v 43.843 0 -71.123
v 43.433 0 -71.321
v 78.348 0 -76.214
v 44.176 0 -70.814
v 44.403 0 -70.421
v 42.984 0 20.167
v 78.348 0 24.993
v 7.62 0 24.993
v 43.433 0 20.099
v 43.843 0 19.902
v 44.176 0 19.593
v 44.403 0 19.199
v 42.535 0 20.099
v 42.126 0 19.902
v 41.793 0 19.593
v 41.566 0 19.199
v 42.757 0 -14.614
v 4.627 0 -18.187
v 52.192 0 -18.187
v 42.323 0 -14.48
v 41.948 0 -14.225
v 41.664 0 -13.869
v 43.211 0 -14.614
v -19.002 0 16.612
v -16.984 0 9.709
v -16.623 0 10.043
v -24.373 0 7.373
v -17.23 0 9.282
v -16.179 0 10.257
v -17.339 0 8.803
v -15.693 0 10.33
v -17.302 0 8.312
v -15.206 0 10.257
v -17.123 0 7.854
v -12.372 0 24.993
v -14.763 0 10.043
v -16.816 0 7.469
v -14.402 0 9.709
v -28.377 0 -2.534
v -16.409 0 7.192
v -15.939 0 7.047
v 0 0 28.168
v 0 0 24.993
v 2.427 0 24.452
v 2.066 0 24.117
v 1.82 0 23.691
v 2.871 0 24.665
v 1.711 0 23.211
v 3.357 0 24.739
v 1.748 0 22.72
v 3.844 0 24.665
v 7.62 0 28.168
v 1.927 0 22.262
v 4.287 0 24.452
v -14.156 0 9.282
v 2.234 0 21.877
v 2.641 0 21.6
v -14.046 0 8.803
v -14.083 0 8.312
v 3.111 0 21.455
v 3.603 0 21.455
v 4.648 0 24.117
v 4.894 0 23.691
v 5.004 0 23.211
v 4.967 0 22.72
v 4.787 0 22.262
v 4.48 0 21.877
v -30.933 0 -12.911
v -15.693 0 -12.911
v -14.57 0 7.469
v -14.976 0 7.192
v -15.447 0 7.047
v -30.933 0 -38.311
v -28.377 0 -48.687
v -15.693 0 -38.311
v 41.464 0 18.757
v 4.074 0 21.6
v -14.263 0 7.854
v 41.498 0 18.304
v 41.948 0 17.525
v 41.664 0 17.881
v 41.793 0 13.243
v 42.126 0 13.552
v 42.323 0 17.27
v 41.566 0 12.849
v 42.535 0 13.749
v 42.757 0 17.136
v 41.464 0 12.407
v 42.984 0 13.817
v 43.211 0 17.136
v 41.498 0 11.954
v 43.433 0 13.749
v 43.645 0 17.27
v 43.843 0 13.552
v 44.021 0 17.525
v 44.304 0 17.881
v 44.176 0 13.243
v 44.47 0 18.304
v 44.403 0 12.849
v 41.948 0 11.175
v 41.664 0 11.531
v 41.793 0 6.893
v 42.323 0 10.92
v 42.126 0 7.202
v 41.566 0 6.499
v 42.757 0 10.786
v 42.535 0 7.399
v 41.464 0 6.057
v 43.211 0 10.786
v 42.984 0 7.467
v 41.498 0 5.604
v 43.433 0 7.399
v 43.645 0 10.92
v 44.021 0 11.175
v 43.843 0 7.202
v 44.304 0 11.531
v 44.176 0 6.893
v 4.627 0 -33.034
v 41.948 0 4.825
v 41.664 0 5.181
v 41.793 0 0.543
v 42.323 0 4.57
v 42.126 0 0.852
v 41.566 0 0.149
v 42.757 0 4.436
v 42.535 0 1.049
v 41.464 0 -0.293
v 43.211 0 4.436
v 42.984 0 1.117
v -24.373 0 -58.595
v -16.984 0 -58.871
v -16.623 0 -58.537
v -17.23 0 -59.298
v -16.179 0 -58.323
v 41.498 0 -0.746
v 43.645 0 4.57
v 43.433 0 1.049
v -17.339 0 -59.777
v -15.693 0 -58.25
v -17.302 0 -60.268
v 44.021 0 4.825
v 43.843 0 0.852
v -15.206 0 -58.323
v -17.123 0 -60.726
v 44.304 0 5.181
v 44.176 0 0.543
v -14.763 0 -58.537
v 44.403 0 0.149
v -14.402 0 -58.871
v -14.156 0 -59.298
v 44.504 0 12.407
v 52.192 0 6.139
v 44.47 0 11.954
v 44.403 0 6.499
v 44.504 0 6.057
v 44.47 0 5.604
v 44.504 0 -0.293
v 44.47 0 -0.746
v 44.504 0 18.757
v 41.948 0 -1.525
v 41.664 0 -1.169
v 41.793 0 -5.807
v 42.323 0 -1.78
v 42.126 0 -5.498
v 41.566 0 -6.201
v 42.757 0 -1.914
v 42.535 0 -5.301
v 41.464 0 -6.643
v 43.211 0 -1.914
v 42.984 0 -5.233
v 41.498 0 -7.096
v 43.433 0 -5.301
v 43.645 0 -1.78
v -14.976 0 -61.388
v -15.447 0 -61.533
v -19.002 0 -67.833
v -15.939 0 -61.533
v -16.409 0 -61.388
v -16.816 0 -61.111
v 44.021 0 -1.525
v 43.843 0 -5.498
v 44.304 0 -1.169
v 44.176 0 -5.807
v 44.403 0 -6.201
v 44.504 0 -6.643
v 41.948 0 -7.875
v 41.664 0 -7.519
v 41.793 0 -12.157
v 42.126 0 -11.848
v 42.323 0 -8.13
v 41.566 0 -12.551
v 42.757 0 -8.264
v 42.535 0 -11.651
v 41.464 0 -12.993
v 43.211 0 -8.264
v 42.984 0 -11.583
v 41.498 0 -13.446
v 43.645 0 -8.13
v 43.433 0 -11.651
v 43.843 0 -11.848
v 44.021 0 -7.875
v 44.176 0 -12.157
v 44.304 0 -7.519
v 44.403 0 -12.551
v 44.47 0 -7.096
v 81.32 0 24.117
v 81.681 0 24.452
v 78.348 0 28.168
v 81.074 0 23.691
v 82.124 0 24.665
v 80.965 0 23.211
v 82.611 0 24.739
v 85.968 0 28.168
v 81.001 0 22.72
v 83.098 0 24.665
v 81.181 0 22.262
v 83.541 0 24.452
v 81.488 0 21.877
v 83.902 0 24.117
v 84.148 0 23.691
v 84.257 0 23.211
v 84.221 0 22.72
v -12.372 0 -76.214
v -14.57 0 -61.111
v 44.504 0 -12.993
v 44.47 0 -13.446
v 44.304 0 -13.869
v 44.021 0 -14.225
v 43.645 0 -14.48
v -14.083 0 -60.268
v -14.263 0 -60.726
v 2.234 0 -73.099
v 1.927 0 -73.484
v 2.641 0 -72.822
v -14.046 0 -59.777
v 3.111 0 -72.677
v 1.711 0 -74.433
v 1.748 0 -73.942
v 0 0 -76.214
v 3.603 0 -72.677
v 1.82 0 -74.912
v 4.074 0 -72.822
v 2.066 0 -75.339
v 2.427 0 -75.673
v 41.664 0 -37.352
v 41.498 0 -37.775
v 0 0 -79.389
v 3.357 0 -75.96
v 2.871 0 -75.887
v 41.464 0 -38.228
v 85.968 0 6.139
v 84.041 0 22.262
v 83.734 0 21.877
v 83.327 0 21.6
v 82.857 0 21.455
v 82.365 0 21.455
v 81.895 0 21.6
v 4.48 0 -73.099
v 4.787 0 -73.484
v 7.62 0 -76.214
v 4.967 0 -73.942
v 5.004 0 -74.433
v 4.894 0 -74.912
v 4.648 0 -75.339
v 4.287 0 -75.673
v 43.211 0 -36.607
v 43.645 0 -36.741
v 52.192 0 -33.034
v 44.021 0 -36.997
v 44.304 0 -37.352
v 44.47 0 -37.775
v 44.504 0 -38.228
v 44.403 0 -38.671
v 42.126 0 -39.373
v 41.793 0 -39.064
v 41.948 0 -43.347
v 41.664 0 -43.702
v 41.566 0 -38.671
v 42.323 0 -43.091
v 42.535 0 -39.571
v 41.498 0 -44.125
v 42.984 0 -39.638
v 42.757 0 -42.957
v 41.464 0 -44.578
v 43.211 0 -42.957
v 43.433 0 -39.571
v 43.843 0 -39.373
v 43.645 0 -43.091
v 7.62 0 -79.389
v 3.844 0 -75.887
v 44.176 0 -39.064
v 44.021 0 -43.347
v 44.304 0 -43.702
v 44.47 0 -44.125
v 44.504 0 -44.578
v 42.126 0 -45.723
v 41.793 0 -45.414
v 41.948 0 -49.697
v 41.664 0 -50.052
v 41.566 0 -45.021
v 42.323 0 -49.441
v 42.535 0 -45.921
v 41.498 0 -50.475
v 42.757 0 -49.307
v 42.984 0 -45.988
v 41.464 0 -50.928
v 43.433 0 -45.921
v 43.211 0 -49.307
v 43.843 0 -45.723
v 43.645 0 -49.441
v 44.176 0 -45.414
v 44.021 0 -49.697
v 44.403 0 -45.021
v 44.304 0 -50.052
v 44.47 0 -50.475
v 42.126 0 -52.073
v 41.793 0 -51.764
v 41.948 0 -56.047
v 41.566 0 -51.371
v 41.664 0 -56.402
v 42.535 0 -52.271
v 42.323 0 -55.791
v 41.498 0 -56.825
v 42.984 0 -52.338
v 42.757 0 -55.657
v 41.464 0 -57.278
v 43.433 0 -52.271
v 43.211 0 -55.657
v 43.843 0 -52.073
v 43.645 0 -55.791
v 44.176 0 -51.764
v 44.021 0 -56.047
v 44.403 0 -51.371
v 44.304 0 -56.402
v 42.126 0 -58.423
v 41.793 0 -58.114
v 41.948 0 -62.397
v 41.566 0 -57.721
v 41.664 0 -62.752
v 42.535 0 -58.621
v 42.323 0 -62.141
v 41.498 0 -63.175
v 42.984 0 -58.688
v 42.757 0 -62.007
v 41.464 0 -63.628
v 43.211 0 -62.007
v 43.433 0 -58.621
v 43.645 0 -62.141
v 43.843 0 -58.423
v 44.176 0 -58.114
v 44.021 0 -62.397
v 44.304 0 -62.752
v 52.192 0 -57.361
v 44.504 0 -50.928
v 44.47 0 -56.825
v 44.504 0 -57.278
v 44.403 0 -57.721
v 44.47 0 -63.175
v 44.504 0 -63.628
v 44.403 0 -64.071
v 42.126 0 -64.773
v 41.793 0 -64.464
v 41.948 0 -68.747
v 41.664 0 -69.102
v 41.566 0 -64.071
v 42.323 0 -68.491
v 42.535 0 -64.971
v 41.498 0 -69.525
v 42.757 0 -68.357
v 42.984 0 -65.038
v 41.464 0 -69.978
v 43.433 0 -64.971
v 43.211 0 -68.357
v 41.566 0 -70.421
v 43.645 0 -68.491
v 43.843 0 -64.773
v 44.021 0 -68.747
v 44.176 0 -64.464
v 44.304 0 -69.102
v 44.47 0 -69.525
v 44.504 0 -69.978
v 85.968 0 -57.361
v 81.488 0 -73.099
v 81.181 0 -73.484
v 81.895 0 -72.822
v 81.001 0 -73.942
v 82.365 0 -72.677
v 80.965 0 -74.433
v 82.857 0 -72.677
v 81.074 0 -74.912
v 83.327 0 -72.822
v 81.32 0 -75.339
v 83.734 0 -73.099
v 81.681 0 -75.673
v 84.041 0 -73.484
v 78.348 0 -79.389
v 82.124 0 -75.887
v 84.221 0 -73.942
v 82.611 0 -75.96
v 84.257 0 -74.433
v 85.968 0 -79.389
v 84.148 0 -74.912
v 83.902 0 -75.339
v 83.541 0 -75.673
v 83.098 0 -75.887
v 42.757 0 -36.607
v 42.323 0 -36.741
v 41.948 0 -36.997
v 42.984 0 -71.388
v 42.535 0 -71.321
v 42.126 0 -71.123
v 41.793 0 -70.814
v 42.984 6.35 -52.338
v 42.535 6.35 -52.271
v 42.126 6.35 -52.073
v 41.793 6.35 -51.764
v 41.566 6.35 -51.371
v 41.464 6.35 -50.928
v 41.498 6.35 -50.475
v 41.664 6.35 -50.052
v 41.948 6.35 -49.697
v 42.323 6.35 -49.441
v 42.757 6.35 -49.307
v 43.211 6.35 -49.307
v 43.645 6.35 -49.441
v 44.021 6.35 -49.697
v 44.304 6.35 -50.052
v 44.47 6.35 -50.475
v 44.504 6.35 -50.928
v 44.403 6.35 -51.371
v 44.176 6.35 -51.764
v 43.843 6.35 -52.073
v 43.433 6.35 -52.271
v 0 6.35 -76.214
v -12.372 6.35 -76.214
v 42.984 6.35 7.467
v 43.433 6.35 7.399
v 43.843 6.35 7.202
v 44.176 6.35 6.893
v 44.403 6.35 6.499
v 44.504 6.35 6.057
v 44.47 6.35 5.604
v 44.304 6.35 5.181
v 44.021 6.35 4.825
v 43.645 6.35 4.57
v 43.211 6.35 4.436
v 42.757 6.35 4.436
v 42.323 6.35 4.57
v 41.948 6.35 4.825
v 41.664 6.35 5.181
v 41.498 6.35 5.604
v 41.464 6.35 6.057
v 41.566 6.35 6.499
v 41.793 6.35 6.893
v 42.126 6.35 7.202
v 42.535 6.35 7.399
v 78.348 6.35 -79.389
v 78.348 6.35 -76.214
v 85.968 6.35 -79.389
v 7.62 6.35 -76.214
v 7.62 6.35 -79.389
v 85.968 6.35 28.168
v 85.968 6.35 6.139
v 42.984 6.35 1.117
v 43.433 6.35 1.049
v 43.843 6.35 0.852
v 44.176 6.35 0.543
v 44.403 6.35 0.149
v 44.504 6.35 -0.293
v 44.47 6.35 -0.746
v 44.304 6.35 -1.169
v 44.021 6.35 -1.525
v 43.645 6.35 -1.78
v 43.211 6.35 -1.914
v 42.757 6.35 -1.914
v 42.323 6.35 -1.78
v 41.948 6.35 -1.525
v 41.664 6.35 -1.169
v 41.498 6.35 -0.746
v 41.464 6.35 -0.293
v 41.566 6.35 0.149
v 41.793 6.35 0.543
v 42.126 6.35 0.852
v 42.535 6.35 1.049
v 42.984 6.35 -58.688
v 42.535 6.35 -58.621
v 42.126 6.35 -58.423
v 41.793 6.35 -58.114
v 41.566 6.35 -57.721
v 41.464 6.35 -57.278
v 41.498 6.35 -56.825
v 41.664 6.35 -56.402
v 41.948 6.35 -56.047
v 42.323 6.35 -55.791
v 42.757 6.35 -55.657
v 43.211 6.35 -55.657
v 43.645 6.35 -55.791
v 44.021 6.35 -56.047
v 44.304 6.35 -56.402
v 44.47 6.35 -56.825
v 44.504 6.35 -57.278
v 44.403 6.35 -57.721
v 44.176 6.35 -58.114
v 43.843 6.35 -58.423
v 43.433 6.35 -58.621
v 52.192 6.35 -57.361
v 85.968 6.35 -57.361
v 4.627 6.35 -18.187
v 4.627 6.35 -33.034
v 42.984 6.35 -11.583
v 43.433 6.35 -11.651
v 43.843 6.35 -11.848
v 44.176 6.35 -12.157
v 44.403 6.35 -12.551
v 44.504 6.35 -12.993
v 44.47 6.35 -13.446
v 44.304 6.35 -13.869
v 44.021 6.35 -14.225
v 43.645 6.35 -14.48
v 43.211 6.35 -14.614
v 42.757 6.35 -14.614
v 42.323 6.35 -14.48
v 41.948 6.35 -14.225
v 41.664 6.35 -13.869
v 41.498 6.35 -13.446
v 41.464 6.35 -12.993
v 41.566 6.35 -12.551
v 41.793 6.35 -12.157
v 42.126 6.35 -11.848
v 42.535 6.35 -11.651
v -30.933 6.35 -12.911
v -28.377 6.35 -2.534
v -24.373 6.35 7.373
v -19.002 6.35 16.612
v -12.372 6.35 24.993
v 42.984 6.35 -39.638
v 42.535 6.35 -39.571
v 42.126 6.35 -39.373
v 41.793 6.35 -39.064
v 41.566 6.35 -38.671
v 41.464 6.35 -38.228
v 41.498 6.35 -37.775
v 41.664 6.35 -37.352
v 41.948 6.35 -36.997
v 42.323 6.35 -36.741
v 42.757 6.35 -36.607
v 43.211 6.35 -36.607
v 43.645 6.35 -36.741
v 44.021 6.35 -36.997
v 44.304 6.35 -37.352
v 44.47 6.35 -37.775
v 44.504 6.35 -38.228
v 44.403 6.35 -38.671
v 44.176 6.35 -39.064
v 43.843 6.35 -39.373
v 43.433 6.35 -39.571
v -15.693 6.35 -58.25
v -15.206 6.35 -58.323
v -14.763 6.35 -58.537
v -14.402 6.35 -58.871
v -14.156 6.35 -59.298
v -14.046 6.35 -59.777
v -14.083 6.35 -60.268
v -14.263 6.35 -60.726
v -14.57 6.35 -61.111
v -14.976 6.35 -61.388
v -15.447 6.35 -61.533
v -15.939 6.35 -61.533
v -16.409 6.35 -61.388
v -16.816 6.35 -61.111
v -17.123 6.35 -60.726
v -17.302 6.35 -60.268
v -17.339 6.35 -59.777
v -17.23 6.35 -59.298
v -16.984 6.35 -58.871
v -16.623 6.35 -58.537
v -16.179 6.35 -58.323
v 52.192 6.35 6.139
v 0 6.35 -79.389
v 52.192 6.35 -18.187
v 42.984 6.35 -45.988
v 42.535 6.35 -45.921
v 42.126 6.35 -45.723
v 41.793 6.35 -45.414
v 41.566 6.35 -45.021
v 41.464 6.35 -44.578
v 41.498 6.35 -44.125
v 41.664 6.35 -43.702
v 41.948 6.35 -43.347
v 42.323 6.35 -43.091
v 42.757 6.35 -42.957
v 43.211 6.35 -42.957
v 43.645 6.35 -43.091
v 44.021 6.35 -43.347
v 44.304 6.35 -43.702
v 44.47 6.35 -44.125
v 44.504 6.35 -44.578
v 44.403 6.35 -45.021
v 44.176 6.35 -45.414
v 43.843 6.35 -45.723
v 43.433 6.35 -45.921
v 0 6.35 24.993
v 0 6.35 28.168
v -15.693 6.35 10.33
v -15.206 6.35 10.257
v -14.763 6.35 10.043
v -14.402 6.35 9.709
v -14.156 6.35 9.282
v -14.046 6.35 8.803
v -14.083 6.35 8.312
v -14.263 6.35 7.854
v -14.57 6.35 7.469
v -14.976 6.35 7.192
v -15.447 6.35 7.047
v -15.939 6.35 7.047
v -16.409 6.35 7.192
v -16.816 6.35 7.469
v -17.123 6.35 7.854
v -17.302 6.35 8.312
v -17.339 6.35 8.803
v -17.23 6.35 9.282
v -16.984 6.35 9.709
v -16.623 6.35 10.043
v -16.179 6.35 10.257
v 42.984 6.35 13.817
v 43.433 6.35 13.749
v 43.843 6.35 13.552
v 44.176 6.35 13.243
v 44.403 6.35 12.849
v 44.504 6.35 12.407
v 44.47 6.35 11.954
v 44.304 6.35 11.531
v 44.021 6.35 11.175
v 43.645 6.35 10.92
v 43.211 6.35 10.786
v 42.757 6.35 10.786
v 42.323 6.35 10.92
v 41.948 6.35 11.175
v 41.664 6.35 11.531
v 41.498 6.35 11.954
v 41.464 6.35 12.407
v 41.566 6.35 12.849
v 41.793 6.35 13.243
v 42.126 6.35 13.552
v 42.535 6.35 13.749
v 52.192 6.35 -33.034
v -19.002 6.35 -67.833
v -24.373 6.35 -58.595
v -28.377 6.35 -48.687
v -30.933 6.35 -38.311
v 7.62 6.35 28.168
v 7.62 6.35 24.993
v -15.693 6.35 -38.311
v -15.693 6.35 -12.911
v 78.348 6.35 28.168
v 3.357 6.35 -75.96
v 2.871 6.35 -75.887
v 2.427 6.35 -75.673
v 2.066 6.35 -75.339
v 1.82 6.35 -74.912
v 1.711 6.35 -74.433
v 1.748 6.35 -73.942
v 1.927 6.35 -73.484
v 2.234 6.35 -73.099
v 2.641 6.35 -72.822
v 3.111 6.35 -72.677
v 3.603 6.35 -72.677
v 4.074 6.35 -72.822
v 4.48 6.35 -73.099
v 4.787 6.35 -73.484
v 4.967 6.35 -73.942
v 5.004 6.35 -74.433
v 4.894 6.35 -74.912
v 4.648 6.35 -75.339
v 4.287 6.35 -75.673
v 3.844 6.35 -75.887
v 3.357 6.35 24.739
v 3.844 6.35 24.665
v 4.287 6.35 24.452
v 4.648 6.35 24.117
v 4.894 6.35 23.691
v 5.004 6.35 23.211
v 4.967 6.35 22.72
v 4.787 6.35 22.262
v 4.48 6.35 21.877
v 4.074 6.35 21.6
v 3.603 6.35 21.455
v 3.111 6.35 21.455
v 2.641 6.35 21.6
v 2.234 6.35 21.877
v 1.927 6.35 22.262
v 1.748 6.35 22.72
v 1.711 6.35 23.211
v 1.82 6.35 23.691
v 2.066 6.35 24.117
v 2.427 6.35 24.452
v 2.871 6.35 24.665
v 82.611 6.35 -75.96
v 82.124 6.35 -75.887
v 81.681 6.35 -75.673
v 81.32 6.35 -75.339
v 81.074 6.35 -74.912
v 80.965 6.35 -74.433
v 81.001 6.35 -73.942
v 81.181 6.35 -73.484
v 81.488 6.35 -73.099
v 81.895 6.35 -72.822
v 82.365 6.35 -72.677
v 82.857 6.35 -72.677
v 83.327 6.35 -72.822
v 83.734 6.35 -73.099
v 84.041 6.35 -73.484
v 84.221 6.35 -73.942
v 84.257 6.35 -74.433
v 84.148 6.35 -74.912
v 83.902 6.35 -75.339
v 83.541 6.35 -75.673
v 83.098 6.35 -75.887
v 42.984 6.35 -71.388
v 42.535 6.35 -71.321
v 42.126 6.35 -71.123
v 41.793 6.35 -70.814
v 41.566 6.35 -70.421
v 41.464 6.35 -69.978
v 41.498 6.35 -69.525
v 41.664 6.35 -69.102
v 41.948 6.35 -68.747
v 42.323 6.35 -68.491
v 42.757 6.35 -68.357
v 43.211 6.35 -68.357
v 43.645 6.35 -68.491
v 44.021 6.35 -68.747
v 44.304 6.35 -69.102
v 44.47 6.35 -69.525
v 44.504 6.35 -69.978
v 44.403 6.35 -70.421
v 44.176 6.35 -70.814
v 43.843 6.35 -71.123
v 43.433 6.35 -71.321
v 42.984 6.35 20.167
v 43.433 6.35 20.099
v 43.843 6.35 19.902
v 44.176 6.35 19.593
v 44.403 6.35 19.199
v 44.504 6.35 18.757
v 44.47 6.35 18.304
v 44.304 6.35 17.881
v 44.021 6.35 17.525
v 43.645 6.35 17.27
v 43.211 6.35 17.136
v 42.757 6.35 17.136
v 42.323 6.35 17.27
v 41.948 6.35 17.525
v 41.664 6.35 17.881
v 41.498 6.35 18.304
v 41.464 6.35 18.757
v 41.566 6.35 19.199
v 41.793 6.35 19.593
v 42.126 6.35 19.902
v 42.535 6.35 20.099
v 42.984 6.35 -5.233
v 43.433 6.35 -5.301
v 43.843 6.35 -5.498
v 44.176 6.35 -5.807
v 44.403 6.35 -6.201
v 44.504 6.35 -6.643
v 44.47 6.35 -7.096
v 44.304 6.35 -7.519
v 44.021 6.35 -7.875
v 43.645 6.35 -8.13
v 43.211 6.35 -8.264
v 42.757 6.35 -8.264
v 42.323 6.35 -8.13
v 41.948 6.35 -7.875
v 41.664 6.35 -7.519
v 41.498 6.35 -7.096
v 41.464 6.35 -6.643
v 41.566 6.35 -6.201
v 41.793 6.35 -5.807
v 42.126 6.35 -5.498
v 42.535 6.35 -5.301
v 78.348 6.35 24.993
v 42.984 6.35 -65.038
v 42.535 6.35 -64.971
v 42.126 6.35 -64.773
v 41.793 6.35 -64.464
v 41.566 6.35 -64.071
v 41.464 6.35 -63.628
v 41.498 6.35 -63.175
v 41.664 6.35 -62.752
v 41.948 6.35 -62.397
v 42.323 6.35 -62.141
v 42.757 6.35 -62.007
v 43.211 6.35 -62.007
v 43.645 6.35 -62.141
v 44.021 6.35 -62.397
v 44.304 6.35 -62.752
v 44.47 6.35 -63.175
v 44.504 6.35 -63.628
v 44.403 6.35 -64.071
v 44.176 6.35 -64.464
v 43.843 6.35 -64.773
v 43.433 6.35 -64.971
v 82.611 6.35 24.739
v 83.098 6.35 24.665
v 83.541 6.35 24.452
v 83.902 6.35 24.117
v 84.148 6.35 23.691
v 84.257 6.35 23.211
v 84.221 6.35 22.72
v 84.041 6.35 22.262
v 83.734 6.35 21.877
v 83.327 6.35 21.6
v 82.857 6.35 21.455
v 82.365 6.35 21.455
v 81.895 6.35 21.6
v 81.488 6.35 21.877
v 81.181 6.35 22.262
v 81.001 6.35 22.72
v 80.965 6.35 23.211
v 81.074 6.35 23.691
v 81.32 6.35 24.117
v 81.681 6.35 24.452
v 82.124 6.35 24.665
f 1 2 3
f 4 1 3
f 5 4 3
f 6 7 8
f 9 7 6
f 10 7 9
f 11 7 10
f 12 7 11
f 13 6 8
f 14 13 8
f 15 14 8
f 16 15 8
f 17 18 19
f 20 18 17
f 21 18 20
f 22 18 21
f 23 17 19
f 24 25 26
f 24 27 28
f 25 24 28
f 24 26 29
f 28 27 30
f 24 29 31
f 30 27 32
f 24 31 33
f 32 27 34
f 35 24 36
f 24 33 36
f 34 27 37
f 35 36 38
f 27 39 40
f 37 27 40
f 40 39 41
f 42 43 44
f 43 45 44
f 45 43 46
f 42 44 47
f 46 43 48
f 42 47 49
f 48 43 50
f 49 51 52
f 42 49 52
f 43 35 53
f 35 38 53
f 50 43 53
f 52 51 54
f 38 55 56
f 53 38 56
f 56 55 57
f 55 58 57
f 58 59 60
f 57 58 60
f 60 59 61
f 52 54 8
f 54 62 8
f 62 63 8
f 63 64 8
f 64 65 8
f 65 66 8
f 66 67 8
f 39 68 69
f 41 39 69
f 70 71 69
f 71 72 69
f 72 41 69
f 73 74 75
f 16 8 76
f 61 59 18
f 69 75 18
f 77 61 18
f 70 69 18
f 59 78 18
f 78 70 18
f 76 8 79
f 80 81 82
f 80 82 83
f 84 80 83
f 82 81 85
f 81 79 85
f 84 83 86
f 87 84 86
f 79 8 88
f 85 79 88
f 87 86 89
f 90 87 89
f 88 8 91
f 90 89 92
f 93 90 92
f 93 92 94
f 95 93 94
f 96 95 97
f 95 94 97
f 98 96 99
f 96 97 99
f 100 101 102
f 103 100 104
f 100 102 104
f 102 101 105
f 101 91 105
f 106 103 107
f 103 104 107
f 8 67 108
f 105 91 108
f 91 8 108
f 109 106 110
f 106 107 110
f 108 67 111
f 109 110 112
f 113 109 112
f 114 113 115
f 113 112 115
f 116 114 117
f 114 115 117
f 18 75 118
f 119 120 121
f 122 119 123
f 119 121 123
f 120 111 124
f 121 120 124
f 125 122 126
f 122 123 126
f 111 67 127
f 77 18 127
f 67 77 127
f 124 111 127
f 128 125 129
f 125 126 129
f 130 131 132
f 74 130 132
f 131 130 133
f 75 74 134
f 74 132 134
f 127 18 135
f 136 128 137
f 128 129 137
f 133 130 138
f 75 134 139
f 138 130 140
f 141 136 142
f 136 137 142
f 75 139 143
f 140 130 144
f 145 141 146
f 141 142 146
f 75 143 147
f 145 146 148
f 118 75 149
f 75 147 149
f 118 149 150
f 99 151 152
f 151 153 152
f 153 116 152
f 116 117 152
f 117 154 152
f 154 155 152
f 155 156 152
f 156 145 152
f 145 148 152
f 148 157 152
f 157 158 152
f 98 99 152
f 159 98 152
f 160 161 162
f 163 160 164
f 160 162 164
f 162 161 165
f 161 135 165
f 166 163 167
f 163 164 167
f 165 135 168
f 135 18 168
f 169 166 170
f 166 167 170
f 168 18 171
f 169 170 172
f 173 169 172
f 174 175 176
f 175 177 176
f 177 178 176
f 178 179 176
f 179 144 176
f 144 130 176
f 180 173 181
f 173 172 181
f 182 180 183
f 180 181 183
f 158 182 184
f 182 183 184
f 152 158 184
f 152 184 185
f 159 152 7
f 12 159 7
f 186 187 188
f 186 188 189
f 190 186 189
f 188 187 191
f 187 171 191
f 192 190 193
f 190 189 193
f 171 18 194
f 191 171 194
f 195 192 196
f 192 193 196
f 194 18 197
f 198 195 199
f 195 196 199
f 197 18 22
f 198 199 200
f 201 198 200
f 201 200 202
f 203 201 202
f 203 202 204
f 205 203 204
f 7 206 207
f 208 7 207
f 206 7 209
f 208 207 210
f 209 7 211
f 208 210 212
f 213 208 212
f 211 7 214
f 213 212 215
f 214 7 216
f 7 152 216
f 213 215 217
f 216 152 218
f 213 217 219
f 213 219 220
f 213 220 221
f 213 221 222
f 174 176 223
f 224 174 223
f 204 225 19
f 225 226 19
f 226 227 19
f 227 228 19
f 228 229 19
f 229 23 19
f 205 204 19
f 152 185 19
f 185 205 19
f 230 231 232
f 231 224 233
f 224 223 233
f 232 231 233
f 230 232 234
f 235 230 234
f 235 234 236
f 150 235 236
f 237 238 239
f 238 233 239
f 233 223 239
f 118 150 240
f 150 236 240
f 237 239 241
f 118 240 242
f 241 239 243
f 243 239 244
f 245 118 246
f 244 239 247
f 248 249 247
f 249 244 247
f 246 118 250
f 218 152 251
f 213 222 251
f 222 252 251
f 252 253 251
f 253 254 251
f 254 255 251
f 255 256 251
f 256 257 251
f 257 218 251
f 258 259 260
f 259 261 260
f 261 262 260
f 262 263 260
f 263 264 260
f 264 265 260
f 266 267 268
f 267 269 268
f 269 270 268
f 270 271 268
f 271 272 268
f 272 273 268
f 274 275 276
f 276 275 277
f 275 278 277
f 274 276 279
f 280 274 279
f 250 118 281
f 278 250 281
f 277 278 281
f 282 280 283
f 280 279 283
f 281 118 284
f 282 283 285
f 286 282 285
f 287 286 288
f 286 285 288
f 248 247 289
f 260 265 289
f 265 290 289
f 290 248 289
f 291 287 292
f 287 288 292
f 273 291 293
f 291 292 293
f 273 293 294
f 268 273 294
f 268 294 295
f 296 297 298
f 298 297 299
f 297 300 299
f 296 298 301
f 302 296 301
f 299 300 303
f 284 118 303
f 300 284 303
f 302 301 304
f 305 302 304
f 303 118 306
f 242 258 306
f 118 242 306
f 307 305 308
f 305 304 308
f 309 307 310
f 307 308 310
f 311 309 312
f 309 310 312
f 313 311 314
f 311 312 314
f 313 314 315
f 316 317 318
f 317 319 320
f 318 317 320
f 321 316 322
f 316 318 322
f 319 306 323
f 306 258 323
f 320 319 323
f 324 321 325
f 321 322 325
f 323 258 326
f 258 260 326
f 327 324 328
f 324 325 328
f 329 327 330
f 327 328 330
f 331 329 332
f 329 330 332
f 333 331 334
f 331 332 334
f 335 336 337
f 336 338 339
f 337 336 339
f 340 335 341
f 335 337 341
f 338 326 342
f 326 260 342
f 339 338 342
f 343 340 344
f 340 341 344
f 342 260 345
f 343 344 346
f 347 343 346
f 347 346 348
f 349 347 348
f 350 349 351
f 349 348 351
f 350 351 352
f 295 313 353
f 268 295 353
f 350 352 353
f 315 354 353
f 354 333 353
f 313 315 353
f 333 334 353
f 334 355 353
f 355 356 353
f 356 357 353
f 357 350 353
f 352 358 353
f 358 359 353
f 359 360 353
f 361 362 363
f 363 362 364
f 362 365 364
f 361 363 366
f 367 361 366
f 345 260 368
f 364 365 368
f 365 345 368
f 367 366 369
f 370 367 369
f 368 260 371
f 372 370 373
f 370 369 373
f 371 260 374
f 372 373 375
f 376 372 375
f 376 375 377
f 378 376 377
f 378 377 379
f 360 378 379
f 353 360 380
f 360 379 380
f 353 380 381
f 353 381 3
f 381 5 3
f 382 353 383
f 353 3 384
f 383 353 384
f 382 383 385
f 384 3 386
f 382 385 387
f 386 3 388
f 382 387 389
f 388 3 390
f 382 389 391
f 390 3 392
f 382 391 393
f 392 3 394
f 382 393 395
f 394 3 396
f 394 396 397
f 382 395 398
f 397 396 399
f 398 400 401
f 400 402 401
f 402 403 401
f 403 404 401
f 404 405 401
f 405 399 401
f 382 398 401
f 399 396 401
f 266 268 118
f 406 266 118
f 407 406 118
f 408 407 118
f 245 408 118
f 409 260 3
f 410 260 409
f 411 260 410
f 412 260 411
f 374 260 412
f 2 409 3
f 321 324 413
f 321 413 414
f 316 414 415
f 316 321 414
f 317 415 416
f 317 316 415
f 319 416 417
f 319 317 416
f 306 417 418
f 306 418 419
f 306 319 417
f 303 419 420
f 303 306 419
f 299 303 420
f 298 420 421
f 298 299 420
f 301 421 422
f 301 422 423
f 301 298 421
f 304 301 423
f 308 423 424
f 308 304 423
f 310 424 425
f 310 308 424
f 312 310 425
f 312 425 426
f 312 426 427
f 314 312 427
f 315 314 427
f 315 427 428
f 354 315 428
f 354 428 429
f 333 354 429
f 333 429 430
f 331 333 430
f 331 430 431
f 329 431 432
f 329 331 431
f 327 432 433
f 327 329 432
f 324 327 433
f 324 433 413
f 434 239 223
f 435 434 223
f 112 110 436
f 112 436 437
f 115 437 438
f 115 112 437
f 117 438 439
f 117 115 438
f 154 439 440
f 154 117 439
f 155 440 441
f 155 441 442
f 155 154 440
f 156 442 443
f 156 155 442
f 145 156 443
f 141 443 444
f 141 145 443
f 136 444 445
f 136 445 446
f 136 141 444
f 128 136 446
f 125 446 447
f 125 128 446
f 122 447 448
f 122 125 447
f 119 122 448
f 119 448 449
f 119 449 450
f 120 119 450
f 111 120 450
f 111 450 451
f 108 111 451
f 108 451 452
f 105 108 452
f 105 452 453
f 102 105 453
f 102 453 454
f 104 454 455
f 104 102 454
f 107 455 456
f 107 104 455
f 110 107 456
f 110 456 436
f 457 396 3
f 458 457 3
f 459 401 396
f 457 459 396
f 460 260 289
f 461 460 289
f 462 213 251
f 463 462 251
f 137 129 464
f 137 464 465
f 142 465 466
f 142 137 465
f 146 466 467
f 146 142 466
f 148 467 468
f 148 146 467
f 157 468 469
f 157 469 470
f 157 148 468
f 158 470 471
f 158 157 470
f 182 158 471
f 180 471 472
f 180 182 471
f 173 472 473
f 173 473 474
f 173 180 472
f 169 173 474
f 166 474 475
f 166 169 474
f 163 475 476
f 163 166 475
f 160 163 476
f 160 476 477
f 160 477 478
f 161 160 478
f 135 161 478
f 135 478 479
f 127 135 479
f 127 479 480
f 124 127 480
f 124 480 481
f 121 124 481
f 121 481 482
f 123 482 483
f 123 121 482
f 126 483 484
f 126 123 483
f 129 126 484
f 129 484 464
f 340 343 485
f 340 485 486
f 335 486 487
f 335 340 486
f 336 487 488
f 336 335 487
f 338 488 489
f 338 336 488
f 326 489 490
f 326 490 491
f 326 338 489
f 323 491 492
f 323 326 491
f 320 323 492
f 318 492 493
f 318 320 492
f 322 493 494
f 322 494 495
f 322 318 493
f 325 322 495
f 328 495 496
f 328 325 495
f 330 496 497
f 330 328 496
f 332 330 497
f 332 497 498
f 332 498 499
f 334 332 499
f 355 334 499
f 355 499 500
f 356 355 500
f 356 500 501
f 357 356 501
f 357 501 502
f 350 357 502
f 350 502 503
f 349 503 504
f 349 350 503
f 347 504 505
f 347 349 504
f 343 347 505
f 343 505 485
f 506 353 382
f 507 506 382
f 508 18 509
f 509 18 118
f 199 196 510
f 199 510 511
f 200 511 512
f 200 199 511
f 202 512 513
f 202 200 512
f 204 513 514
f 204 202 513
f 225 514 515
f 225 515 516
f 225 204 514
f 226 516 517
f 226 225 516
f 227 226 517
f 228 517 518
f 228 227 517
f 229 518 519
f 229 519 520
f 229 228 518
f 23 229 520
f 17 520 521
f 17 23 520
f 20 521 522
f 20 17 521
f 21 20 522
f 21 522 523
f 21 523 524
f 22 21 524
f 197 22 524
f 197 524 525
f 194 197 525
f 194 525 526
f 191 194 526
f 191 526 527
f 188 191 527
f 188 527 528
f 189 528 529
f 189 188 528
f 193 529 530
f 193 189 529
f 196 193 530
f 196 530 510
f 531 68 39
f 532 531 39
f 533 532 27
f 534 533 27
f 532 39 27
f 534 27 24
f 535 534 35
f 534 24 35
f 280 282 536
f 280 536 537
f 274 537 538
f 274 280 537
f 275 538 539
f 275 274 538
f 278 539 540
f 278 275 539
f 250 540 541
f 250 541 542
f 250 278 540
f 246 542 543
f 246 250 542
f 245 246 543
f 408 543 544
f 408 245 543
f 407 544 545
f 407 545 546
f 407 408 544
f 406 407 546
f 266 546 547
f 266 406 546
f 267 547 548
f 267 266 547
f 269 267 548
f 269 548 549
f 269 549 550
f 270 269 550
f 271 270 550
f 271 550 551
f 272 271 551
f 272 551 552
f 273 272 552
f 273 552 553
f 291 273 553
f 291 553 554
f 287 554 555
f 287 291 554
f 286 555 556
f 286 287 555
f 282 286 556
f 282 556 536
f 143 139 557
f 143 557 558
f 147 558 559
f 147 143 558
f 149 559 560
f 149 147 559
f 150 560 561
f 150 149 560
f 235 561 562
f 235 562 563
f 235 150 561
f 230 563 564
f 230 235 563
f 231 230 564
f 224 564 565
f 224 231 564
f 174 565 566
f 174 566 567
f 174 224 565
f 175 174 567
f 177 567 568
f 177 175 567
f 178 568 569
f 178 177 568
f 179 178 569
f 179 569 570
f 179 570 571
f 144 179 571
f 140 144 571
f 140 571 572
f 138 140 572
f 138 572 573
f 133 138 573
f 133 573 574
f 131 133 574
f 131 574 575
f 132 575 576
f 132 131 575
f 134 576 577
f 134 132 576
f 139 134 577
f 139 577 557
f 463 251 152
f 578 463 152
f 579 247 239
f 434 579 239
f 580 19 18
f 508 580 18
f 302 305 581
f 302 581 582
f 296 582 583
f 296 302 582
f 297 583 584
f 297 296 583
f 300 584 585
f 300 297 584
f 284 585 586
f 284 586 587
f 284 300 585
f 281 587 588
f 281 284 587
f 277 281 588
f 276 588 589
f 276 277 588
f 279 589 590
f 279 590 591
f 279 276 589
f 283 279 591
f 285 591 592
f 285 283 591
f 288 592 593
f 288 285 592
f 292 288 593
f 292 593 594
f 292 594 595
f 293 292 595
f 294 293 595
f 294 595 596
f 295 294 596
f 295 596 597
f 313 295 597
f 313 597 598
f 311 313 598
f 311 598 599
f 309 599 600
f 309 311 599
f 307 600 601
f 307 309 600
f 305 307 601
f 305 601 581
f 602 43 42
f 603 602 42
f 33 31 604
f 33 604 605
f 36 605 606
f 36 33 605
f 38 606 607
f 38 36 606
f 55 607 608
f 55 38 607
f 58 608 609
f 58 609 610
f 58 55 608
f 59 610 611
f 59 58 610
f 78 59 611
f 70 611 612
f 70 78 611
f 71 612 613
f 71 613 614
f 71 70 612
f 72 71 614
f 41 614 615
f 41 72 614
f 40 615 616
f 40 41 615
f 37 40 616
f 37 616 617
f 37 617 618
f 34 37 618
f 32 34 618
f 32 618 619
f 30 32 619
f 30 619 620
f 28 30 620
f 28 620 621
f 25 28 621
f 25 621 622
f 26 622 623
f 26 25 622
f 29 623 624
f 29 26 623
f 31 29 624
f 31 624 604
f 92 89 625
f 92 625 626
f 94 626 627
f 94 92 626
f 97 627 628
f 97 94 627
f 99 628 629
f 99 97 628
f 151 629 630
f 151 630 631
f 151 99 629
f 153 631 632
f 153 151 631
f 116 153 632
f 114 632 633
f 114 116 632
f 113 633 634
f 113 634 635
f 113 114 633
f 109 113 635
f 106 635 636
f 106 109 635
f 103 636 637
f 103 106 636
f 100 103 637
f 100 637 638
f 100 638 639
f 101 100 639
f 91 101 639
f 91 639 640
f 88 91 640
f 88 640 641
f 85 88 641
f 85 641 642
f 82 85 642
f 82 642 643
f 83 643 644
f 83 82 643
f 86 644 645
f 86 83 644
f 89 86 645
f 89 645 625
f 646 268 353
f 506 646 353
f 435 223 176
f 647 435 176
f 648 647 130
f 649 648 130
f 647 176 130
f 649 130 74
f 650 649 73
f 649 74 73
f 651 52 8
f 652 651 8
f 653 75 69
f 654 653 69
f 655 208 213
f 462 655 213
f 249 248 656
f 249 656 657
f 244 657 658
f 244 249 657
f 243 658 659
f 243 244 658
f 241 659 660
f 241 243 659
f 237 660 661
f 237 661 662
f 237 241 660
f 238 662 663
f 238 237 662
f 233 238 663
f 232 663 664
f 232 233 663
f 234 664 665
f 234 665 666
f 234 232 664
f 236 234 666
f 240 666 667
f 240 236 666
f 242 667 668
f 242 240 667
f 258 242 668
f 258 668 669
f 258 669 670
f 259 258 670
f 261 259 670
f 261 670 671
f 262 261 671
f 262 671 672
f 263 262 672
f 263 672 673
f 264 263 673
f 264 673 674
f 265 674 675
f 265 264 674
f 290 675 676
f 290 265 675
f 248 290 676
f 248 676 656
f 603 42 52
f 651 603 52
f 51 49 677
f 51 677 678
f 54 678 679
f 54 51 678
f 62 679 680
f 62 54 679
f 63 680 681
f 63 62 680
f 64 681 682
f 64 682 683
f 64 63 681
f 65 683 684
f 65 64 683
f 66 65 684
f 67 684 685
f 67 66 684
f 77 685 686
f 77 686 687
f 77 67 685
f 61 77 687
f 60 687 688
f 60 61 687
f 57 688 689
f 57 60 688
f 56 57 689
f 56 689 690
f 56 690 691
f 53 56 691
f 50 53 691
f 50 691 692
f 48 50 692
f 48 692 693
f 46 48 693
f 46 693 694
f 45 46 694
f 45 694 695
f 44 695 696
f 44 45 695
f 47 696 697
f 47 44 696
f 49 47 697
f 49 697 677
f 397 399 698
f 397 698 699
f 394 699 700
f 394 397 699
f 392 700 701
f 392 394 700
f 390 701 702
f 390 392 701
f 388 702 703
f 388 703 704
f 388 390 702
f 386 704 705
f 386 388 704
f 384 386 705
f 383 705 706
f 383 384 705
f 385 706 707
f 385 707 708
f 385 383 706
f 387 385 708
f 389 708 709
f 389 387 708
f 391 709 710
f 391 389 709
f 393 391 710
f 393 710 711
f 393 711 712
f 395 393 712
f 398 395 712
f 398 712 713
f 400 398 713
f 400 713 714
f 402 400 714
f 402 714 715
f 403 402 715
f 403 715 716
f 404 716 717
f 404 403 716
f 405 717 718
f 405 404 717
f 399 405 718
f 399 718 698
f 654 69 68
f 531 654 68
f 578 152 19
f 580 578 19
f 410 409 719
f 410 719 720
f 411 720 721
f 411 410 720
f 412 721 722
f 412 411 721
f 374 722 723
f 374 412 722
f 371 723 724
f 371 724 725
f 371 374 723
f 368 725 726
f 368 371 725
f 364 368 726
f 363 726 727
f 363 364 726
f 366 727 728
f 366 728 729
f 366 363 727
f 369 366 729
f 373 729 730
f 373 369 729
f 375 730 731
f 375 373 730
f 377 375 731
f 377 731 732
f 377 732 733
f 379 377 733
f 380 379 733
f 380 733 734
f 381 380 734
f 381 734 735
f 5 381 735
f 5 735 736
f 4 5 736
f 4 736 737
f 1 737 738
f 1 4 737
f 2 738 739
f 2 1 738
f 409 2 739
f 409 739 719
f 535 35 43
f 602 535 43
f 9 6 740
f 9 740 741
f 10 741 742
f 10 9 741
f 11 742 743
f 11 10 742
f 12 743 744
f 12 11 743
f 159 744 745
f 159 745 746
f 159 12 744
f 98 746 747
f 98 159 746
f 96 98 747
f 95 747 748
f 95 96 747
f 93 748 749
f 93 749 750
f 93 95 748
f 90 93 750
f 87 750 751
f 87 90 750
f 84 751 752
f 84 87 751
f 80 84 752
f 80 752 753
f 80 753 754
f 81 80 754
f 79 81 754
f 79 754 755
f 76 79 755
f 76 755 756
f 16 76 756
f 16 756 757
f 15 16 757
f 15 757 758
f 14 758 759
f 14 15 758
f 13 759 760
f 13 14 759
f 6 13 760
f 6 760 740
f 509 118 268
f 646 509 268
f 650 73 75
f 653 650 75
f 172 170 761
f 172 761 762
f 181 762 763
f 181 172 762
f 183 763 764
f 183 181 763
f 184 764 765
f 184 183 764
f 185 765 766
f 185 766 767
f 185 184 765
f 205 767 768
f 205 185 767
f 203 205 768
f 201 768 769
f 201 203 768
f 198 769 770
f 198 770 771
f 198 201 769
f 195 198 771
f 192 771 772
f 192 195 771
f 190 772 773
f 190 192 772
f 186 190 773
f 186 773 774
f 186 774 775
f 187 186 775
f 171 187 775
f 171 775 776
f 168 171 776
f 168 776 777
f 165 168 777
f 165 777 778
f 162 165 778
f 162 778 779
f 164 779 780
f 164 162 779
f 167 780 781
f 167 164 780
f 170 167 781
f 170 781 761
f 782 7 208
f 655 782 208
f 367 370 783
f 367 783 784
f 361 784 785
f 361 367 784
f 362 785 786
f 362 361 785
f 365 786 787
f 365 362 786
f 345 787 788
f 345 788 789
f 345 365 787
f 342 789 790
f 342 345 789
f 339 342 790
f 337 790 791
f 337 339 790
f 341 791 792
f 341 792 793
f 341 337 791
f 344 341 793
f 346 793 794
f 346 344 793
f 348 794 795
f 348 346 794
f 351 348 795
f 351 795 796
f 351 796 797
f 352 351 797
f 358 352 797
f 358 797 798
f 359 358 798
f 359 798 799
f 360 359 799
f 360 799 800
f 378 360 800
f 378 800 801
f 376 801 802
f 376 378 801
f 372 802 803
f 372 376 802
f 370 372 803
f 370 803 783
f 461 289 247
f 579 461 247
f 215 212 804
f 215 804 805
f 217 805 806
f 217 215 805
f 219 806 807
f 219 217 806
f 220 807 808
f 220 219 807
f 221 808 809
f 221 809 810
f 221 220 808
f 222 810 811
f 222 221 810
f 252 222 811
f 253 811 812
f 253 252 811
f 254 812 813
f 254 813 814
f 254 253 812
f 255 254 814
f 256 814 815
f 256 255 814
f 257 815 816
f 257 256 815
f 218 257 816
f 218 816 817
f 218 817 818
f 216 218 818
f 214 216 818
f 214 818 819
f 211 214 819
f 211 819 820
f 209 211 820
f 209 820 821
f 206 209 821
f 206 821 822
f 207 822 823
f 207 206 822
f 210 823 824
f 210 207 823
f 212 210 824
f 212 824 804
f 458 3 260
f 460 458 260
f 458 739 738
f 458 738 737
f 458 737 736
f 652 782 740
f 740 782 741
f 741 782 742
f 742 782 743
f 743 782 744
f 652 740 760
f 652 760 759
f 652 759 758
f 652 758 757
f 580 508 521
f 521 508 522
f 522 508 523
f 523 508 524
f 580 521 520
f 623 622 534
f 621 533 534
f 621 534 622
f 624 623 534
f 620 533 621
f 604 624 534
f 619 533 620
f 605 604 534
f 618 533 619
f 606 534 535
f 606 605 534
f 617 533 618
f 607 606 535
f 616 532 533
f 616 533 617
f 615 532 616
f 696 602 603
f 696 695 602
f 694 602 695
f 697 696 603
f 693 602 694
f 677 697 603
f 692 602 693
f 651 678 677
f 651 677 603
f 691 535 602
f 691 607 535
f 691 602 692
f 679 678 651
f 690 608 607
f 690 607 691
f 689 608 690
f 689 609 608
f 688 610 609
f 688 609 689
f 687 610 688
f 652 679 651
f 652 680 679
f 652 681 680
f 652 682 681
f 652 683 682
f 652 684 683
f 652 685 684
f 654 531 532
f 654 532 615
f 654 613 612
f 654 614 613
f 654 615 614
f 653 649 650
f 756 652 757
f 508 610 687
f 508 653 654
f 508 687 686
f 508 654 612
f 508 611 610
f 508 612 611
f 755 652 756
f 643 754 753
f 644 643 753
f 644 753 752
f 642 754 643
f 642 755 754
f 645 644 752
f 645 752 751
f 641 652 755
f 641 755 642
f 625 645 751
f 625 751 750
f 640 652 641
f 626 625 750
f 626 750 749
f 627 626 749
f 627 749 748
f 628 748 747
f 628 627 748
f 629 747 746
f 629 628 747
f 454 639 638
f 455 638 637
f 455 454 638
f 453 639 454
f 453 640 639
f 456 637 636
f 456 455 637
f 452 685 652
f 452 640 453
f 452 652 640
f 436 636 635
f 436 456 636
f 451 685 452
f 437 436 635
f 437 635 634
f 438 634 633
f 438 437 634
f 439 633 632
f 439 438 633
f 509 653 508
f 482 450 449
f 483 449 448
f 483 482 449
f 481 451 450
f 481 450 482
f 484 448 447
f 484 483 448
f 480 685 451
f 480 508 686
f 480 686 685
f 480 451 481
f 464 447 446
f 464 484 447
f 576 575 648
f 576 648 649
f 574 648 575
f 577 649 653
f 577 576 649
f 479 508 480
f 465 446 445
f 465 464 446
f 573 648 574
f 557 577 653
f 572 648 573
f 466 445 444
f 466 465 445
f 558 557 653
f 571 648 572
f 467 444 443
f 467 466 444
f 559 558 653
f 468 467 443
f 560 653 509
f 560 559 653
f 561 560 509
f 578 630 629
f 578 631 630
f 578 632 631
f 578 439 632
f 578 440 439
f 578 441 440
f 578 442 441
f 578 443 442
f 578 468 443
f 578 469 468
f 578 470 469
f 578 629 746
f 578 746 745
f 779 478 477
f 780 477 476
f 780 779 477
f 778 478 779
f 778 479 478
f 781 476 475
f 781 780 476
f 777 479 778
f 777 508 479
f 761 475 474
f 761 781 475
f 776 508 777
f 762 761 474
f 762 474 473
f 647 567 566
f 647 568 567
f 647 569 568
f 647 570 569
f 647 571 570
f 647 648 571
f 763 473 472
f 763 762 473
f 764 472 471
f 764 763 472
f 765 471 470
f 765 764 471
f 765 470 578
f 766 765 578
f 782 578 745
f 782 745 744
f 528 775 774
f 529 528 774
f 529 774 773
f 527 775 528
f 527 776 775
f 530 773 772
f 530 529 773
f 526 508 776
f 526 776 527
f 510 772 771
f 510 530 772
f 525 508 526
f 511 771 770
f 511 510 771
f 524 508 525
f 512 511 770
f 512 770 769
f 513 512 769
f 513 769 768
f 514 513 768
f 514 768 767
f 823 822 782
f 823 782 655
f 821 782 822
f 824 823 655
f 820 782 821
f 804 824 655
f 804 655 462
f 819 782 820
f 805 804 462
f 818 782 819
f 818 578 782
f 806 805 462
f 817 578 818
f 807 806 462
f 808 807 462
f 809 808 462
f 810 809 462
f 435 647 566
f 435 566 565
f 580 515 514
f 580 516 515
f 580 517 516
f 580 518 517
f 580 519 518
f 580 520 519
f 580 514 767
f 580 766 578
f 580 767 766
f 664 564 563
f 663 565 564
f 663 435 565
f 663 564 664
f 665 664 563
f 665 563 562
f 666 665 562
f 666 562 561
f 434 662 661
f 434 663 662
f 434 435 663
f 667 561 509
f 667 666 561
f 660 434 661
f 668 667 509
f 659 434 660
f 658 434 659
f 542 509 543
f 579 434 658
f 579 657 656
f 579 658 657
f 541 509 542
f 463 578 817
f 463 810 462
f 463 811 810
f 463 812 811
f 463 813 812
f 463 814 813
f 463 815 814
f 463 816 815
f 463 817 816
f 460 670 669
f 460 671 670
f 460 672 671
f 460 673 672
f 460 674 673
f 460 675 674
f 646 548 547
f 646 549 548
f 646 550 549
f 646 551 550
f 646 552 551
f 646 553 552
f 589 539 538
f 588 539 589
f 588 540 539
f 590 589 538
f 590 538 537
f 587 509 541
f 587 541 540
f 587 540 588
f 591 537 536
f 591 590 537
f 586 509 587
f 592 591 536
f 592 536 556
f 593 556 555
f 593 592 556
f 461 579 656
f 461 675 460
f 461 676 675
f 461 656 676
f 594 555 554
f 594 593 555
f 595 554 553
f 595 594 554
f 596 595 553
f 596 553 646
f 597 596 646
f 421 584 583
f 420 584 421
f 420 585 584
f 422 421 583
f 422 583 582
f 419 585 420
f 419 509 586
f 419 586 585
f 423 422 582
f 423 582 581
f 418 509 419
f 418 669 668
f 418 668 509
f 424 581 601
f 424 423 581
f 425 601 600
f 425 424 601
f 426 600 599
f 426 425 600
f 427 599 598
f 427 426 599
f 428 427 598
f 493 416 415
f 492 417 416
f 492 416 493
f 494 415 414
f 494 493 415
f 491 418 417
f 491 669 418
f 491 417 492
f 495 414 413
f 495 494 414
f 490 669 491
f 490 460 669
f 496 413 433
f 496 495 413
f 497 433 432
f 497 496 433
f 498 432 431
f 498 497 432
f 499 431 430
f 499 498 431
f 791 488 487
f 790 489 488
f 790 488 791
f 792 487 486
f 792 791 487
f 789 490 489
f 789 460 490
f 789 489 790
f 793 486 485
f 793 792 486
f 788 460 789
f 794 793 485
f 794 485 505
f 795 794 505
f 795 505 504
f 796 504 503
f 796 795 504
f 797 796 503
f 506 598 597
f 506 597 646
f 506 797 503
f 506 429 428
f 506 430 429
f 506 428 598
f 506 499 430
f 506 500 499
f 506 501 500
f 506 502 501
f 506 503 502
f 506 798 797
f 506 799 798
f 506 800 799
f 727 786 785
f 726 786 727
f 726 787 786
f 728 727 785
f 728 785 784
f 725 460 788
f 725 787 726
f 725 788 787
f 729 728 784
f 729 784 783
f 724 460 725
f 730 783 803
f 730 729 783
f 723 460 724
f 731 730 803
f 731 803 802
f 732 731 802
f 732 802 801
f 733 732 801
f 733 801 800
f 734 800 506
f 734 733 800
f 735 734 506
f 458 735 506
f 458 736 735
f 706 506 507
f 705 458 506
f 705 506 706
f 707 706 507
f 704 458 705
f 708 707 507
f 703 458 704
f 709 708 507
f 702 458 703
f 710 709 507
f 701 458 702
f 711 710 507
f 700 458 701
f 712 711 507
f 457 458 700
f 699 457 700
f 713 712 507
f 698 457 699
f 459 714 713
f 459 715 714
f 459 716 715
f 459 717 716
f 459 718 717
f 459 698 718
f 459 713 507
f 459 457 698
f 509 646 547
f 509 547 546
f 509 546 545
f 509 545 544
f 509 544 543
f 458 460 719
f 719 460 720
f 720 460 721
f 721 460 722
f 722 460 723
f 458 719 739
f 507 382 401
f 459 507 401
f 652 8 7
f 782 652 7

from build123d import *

# Parameters (mm, degrees)
SKETCH1_R           = 1.651
SKETCH1_R_2         = 1.524
BOSS_EXTRUDE1_DEPTH = 6.35


with BuildPart() as part:
    # Sketch1 → Boss-Extrude1 (new body)
    with BuildSketch(Plane(origin=(0, 0, 0), x_dir=(1, 0, 0), z_dir=(0, 1, 0))):
        with BuildLine():
            Line((33.776652136, 18.187342636), (4.627239322, 18.187342636))
            Line((4.627239322, 18.187342636), (4.627239322, 33.034266248))
            Line((4.627239322, 33.034266248), (33.776652136, 33.034266248))
            Line((33.776652136, 33.034266248), (52.191652136, 33.034266248))
            Line((52.191652136, 33.034266248), (52.191652136, 57.360804442))
            Line((52.191652136, 57.360804442), (85.968304273, 57.360804442))
            Line((85.968304273, 57.360804442), (85.968304273, 76.214266248))
            Line((85.968304273, 76.214266248), (85.968304273, 79.389266248))
            Line((85.968304273, 79.389266248), (78.348304273, 79.389266248))
            Line((78.348304273, 79.389266248), (78.348304273, 76.214266248))
            Line((78.348304273, 76.214266248), (7.62, 76.214266248))
            Line((7.62, 76.214266248), (7.62, 79.389266248))
            Line((7.62, 79.389266248), (0, 79.389266248))
            Line((0, 79.389266248), (0, 76.214266248))
            Line((0, 76.214266248), (-12.371874213, 76.214266248))
            ThreePointArc((-12.371874213, 76.214266248), (-24.373410945, 58.595023332), (-30.932760678, 38.310804442))
            Line((-30.932760678, 38.310804442), (-15.692760678, 38.310804442))
            Line((-15.692760678, 38.310804442), (-15.692760678, 12.910804442))
            Line((-15.692760678, 12.910804442), (-30.932760678, 12.910804442))
            ThreePointArc((-30.932760678, 12.910804442), (-24.373410945, -7.373414447), (-12.371874213, -24.992657364))
            Line((-12.371874213, -24.992657364), (0, -24.992657364))
            Line((0, -24.992657364), (0, -28.167657364))
            Line((0, -28.167657364), (7.62, -28.167657364))
            Line((7.62, -28.167657364), (7.62, -24.992657364))
            Line((7.62, -24.992657364), (78.348304273, -24.992657364))
            Line((78.348304273, -24.992657364), (78.348304273, -28.167657364))
            Line((78.348304273, -28.167657364), (85.968304273, -28.167657364))
            Line((85.968304273, -28.167657364), (85.968304273, -24.992657364))
            Line((85.968304273, -24.992657364), (85.968304273, -6.139195558))
            Line((85.968304273, -6.139195558), (52.191652136, -6.139195558))
            Line((52.191652136, -6.139195558), (52.191652136, 18.187342636))
            Line((52.191652136, 18.187342636), (33.776652136, 18.187342636))
        make_face()
        with Locations(Location((3.357239322, -23.087657364, 0), (0, 0, 270))):
            Circle(SKETCH1_R, mode=Mode.SUBTRACT)
        with Locations(Location((82.611064951, -23.087657364, 0), (0, 0, 270))):
            Circle(SKETCH1_R, mode=Mode.SUBTRACT)
        with Locations(Location((42.984152136, -12.292657364, 0), (0, 0, 270))):
            Circle(SKETCH1_R_2, mode=Mode.SUBTRACT)
        with Locations(Location((42.984152136, -18.642657364, 0), (0, 0, 270))):
            Circle(SKETCH1_R_2, mode=Mode.SUBTRACT)
        with Locations(Location((42.984152136, -5.942657364, 0), (0, 0, 270))):
            Circle(SKETCH1_R_2, mode=Mode.SUBTRACT)
        with Locations(Location((42.984152136, 0.407342636, 0), (0, 0, 270))):
            Circle(SKETCH1_R_2, mode=Mode.SUBTRACT)
        with Locations(Location((42.984152136, 6.757342636, 0), (0, 0, 270))):
            Circle(SKETCH1_R_2, mode=Mode.SUBTRACT)
        with Locations(Location((42.984152136, 13.107342636, 0), (0, 0, 270))):
            Circle(SKETCH1_R_2, mode=Mode.SUBTRACT)
        with Locations(Location((42.984152136, 38.114266248, 0), (0, 0, 90))):
            Circle(SKETCH1_R_2, mode=Mode.SUBTRACT)
        with Locations(Location((82.611064951, 74.309266248, 0), (0, 0, 90))):
            Circle(SKETCH1_R, mode=Mode.SUBTRACT)
        with Locations(Location((3.357239322, 74.309266248, 0), (0, 0, 90))):
            Circle(SKETCH1_R, mode=Mode.SUBTRACT)
        with Locations(Location((-15.692760678, 59.900804442, 0), (0, 0, 270))):
            Circle(SKETCH1_R, mode=Mode.SUBTRACT)
        with Locations(Location((-15.692760678, -8.679195558, 0), (0, 0, 270))):
            Circle(SKETCH1_R, mode=Mode.SUBTRACT)
        with Locations(Location((42.984152136, 44.464266248, 0), (0, 0, 90))):
            Circle(SKETCH1_R_2, mode=Mode.SUBTRACT)
        with Locations(Location((42.984152136, 50.814266248, 0), (0, 0, 90))):
            Circle(SKETCH1_R_2, mode=Mode.SUBTRACT)
        with Locations(Location((42.984152136, 57.164266248, 0), (0, 0, 90))):
            Circle(SKETCH1_R_2, mode=Mode.SUBTRACT)
        with Locations(Location((42.984152136, 63.514266248, 0), (0, 0, 90))):
            Circle(SKETCH1_R_2, mode=Mode.SUBTRACT)
        with Locations(Location((42.984152136, 69.864266248, 0), (0, 0, 90))):
            Circle(SKETCH1_R_2, mode=Mode.SUBTRACT)
    extrude(amount=BOSS_EXTRUDE1_DEPTH)


solid = part.part
